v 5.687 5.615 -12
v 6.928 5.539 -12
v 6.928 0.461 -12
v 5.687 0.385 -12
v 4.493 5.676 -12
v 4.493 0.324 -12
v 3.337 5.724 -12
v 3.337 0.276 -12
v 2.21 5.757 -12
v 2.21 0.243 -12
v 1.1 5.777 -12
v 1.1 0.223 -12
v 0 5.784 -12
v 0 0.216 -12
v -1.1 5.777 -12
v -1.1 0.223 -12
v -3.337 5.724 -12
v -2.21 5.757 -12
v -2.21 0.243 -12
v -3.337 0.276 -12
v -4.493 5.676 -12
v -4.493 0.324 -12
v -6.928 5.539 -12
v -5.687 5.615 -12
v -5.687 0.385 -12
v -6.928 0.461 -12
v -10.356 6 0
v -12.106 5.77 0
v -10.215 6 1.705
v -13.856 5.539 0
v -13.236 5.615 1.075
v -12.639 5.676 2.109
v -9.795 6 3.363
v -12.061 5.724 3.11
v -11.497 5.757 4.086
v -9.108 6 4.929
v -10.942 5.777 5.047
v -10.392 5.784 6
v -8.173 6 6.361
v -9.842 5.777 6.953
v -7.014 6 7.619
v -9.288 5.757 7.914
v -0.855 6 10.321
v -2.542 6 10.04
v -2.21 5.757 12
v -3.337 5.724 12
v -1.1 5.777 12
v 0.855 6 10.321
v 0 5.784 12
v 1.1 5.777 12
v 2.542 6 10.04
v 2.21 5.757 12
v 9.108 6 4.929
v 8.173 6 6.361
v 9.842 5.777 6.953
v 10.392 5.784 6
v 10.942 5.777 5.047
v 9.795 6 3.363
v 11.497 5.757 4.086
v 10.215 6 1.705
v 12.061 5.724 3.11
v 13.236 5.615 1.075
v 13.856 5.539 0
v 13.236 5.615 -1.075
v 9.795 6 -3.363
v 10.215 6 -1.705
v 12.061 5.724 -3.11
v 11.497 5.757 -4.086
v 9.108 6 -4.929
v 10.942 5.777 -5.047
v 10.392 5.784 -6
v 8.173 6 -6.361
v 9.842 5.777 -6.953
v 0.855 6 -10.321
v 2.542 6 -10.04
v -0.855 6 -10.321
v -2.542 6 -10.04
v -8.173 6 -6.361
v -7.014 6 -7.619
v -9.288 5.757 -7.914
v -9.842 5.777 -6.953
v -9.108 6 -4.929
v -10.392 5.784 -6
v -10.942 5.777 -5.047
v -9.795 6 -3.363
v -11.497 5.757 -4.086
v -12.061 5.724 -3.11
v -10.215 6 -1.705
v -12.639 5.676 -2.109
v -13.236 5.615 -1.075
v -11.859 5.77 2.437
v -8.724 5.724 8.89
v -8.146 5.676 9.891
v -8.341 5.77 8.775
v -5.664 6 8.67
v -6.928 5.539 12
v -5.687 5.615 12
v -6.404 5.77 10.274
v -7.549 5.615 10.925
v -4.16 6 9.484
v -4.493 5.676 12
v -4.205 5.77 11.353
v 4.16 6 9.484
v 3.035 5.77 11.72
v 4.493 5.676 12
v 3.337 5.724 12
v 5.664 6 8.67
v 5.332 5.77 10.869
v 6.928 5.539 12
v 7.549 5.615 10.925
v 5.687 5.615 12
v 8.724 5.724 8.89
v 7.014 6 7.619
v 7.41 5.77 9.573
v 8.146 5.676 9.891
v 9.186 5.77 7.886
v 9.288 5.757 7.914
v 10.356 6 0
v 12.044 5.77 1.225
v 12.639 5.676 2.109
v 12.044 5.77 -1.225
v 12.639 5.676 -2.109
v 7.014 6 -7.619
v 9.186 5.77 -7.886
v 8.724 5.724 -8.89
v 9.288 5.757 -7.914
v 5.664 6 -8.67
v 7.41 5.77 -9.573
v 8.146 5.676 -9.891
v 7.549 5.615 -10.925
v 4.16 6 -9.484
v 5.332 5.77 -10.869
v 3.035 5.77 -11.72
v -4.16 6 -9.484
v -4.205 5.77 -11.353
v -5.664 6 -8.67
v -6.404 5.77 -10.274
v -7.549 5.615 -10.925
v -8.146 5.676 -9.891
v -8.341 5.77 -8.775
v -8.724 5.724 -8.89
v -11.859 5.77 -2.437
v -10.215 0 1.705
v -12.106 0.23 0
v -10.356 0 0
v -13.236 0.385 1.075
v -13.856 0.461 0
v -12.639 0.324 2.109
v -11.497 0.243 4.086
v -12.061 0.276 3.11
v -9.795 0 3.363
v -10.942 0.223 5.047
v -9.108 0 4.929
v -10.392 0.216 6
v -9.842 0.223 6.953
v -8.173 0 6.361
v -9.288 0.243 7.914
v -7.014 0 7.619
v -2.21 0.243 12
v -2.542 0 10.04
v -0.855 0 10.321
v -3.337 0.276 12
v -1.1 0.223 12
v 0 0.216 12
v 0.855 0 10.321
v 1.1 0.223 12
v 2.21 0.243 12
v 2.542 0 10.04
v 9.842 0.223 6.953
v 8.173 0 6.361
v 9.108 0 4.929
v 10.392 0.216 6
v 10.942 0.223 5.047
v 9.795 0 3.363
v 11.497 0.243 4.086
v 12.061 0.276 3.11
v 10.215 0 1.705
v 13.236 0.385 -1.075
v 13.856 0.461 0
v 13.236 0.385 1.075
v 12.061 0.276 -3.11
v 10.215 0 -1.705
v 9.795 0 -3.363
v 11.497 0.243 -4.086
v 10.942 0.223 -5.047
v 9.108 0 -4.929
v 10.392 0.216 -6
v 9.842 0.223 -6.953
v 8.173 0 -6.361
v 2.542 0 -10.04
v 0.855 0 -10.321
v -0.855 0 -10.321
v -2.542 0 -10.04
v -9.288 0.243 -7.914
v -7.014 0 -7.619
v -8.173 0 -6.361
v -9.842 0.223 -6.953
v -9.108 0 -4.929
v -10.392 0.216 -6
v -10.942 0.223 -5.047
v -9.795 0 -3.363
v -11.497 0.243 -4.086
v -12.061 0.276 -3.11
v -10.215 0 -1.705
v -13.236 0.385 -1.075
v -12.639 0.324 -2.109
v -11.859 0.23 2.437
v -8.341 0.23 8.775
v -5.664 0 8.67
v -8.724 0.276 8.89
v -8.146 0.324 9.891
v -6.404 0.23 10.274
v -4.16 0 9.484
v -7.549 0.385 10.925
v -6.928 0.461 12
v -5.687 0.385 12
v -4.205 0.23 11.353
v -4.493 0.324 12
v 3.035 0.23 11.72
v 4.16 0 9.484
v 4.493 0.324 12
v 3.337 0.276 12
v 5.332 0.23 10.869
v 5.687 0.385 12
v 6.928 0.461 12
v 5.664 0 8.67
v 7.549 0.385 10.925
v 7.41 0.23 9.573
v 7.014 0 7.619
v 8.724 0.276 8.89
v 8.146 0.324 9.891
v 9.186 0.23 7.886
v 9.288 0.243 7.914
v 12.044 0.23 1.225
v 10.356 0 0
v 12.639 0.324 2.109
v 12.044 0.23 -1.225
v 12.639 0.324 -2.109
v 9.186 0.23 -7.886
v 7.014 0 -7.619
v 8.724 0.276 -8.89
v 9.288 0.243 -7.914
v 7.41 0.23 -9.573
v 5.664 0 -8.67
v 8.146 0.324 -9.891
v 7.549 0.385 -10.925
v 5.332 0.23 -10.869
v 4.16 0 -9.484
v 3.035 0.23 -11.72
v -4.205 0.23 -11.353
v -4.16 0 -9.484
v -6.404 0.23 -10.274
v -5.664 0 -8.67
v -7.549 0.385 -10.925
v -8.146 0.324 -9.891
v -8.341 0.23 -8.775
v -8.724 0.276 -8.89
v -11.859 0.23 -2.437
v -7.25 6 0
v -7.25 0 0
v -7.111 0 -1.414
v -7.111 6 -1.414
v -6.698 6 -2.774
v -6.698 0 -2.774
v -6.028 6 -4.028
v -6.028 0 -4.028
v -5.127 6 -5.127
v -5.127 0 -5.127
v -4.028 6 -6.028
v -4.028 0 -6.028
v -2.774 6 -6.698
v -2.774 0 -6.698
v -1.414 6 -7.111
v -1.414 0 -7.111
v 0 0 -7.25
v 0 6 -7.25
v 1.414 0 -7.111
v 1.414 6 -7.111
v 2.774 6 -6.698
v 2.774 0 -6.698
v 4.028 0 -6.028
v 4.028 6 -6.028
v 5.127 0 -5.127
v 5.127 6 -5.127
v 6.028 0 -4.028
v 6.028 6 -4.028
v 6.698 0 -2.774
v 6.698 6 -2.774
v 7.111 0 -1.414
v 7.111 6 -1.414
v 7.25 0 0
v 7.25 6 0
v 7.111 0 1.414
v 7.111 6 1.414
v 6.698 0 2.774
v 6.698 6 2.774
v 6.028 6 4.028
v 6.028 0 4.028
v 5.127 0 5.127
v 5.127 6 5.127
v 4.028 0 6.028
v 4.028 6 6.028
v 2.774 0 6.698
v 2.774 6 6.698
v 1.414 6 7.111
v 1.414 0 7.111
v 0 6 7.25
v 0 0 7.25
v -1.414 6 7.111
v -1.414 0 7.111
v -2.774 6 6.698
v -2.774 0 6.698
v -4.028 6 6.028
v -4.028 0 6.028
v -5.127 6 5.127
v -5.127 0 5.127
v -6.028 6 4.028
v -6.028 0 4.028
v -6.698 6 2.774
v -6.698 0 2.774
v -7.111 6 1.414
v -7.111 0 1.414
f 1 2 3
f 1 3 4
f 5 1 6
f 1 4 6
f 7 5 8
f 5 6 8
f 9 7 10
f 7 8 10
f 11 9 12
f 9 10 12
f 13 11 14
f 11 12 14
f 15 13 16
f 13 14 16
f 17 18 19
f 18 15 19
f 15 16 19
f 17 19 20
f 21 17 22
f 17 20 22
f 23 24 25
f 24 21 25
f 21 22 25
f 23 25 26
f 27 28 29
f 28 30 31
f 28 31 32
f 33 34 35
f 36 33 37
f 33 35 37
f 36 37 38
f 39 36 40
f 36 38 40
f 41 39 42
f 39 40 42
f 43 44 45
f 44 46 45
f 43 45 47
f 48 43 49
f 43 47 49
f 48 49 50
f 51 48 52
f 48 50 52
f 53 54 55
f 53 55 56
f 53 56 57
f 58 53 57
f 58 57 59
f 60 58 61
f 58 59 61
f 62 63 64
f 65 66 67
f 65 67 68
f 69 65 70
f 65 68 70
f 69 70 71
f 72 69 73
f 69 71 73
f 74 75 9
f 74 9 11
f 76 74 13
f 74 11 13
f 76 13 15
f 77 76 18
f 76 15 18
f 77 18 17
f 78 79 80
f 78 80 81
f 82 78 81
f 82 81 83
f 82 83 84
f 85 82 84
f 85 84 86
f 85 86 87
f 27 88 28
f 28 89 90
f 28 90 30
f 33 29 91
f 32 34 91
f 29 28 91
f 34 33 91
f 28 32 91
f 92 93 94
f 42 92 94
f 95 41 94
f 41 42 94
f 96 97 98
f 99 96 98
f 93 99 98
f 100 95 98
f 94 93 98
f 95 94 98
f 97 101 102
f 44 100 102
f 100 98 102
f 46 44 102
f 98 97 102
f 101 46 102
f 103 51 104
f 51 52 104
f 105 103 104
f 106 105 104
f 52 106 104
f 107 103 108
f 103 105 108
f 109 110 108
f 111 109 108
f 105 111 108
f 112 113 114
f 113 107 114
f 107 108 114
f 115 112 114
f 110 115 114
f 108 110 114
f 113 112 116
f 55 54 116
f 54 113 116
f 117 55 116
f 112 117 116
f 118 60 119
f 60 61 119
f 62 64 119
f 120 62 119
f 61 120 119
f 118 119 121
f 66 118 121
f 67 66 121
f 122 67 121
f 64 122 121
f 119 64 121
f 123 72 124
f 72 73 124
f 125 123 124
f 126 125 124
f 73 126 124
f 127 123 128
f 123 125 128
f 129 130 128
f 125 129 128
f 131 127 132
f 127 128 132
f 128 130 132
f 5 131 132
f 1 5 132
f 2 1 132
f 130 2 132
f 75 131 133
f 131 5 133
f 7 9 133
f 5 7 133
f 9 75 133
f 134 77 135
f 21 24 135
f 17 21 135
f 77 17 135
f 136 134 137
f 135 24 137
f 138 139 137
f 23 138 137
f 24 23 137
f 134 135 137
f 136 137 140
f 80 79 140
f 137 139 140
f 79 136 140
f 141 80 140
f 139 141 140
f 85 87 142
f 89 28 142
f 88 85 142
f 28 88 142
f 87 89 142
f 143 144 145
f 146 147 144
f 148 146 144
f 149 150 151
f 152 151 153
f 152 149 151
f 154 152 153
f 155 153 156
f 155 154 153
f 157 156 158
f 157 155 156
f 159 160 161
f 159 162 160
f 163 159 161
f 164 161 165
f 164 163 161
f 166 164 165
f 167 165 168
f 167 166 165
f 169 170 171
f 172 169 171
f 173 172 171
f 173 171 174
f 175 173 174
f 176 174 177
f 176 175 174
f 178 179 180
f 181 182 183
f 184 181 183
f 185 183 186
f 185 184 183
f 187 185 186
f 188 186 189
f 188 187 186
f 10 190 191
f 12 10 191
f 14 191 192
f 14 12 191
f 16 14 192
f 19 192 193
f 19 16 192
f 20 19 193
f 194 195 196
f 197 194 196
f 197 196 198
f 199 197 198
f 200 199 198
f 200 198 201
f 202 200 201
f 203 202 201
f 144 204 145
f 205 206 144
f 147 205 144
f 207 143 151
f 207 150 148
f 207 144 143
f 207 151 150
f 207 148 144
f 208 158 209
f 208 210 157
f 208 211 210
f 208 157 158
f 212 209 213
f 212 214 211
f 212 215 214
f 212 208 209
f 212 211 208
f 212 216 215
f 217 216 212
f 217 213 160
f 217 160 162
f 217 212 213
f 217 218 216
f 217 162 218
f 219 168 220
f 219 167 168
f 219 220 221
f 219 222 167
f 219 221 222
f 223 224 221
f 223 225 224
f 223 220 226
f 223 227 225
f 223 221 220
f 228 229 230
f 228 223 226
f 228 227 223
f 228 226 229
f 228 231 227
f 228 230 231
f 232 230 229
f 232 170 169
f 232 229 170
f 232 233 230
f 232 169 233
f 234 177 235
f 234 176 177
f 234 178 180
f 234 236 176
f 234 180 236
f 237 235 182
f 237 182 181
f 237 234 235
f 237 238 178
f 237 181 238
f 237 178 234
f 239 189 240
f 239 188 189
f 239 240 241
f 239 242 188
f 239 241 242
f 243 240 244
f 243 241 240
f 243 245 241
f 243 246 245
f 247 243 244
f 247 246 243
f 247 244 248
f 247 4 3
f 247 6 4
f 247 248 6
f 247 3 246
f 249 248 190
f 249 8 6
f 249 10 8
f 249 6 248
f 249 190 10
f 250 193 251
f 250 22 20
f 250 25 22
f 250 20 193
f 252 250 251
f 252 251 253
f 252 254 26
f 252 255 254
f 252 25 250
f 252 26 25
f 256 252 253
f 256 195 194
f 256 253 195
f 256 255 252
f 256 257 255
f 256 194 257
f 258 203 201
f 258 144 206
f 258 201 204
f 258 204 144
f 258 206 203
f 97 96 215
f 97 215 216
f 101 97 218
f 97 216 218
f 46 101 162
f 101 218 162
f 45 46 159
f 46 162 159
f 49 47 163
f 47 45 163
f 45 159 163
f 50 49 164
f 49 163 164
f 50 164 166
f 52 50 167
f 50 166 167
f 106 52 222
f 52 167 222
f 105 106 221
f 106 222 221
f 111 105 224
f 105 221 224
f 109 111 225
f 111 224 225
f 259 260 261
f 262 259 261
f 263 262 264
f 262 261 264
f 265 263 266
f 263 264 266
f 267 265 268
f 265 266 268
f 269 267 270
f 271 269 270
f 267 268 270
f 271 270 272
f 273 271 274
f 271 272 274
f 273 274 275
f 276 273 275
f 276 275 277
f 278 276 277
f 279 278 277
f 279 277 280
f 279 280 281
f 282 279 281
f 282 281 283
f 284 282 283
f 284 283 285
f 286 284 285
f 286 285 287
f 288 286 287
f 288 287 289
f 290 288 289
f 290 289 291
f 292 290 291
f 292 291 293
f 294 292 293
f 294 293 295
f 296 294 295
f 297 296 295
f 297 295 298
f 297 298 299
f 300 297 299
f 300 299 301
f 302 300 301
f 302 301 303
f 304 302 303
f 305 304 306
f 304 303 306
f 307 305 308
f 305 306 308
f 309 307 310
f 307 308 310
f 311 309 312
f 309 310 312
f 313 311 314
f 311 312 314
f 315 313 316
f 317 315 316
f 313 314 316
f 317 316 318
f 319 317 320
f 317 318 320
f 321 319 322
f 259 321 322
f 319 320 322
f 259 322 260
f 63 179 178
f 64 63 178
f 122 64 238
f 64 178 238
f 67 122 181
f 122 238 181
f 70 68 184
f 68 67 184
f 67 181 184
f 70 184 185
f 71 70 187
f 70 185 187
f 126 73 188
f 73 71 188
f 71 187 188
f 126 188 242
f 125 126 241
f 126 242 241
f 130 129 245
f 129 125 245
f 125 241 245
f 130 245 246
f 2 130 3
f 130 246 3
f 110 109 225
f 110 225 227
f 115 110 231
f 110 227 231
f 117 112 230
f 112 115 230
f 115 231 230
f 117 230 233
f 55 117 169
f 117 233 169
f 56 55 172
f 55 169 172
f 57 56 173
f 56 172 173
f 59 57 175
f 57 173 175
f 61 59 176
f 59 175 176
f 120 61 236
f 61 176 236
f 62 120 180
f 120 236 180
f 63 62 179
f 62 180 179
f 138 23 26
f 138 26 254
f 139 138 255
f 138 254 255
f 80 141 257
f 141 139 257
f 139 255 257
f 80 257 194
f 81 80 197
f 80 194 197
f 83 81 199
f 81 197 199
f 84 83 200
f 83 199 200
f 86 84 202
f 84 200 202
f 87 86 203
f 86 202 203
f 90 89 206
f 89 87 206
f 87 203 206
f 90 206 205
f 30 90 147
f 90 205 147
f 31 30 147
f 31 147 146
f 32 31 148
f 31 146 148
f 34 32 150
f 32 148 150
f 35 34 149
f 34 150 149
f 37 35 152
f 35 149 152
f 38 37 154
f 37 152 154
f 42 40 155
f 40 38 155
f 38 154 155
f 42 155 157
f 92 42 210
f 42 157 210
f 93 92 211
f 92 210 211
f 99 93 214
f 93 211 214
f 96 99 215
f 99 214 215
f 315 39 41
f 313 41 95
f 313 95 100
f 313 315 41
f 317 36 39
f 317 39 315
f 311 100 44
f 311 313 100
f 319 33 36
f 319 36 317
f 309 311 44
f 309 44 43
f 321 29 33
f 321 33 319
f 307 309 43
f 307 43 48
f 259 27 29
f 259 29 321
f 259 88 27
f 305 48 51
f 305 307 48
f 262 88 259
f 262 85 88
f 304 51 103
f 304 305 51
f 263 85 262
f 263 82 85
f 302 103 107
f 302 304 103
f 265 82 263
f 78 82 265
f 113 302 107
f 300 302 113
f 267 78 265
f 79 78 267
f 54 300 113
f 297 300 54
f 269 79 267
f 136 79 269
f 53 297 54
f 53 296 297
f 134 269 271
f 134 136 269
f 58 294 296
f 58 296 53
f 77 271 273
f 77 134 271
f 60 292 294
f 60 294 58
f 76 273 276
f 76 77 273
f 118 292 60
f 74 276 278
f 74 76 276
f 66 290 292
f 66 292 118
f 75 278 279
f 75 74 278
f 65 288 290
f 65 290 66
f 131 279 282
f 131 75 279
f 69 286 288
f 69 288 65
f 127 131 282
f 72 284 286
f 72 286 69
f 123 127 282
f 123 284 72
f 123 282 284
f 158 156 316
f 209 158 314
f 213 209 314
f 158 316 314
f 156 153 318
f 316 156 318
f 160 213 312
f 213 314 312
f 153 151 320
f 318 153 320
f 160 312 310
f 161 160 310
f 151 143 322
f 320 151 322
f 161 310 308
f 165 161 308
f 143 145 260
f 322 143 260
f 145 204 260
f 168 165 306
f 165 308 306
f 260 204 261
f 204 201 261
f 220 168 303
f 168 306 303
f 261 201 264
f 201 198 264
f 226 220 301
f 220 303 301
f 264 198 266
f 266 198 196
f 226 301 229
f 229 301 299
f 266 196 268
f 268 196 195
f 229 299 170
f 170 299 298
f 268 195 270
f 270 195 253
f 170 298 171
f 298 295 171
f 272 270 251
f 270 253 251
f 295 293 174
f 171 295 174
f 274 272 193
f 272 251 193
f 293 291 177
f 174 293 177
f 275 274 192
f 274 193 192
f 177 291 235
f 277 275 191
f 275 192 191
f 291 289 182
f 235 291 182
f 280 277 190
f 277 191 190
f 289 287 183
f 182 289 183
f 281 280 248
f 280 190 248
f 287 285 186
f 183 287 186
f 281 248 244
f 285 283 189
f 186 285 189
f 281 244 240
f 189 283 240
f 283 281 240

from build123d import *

# Parameters (mm, degrees)
BOSS_EXTRUDE1_DEPTH        = 6
M16X1_5_TAPPED_HOLE1_D     = 14.5
M16X1_5_TAPPED_HOLE1_DEPTH = 39.5
M16X1_5_TAPPED_HOLE1_TIP   = 4.356239488


with BuildPart() as part:
    # Sketch1 → Boss-Extrude1 (new body)
    with BuildSketch(Plane(origin=(0, 0, 0), x_dir=(1, 0, 0), z_dir=(0, 1, 0))):
        Polygon((6.92820323, 12), (-6.92820323, 12), (-13.856406461, 0), (-6.92820323, -12), (6.92820323, -12), (13.856406461, 0), align=None)
    extrude(amount=BOSS_EXTRUDE1_DEPTH)

    # Sketch2 → Cut-Revolve1 (revolve, cut)
    with BuildSketch(Plane.XY):
        Polygon((-13.856406461, 0), (-10.356406461, 0), (-13.856406461, 0.460783742), align=None)
        Polygon((-13.856406461, 6), (-10.356406461, 6), (-13.856406461, 5.539216258), align=None)
    revolve(axis=Axis((0, 0, 0), (0, 1, 0)), mode=Mode.SUBTRACT)

    # M16x1.5 Tapped Hole1
    with Locations(Plane(origin=(0, 6, 0), x_dir=(1, 0, 0), z_dir=(0, 1, 0))):
        with Locations((0, 0)):
            Hole(M16X1_5_TAPPED_HOLE1_D / 2, depth=M16X1_5_TAPPED_HOLE1_DEPTH)
            with Locations((0, 0, -(M16X1_5_TAPPED_HOLE1_DEPTH + M16X1_5_TAPPED_HOLE1_TIP / 2))):  # 118° drill point
                Cone(0, M16X1_5_TAPPED_HOLE1_D / 2, M16X1_5_TAPPED_HOLE1_TIP, mode=Mode.SUBTRACT)


solid = part.part
